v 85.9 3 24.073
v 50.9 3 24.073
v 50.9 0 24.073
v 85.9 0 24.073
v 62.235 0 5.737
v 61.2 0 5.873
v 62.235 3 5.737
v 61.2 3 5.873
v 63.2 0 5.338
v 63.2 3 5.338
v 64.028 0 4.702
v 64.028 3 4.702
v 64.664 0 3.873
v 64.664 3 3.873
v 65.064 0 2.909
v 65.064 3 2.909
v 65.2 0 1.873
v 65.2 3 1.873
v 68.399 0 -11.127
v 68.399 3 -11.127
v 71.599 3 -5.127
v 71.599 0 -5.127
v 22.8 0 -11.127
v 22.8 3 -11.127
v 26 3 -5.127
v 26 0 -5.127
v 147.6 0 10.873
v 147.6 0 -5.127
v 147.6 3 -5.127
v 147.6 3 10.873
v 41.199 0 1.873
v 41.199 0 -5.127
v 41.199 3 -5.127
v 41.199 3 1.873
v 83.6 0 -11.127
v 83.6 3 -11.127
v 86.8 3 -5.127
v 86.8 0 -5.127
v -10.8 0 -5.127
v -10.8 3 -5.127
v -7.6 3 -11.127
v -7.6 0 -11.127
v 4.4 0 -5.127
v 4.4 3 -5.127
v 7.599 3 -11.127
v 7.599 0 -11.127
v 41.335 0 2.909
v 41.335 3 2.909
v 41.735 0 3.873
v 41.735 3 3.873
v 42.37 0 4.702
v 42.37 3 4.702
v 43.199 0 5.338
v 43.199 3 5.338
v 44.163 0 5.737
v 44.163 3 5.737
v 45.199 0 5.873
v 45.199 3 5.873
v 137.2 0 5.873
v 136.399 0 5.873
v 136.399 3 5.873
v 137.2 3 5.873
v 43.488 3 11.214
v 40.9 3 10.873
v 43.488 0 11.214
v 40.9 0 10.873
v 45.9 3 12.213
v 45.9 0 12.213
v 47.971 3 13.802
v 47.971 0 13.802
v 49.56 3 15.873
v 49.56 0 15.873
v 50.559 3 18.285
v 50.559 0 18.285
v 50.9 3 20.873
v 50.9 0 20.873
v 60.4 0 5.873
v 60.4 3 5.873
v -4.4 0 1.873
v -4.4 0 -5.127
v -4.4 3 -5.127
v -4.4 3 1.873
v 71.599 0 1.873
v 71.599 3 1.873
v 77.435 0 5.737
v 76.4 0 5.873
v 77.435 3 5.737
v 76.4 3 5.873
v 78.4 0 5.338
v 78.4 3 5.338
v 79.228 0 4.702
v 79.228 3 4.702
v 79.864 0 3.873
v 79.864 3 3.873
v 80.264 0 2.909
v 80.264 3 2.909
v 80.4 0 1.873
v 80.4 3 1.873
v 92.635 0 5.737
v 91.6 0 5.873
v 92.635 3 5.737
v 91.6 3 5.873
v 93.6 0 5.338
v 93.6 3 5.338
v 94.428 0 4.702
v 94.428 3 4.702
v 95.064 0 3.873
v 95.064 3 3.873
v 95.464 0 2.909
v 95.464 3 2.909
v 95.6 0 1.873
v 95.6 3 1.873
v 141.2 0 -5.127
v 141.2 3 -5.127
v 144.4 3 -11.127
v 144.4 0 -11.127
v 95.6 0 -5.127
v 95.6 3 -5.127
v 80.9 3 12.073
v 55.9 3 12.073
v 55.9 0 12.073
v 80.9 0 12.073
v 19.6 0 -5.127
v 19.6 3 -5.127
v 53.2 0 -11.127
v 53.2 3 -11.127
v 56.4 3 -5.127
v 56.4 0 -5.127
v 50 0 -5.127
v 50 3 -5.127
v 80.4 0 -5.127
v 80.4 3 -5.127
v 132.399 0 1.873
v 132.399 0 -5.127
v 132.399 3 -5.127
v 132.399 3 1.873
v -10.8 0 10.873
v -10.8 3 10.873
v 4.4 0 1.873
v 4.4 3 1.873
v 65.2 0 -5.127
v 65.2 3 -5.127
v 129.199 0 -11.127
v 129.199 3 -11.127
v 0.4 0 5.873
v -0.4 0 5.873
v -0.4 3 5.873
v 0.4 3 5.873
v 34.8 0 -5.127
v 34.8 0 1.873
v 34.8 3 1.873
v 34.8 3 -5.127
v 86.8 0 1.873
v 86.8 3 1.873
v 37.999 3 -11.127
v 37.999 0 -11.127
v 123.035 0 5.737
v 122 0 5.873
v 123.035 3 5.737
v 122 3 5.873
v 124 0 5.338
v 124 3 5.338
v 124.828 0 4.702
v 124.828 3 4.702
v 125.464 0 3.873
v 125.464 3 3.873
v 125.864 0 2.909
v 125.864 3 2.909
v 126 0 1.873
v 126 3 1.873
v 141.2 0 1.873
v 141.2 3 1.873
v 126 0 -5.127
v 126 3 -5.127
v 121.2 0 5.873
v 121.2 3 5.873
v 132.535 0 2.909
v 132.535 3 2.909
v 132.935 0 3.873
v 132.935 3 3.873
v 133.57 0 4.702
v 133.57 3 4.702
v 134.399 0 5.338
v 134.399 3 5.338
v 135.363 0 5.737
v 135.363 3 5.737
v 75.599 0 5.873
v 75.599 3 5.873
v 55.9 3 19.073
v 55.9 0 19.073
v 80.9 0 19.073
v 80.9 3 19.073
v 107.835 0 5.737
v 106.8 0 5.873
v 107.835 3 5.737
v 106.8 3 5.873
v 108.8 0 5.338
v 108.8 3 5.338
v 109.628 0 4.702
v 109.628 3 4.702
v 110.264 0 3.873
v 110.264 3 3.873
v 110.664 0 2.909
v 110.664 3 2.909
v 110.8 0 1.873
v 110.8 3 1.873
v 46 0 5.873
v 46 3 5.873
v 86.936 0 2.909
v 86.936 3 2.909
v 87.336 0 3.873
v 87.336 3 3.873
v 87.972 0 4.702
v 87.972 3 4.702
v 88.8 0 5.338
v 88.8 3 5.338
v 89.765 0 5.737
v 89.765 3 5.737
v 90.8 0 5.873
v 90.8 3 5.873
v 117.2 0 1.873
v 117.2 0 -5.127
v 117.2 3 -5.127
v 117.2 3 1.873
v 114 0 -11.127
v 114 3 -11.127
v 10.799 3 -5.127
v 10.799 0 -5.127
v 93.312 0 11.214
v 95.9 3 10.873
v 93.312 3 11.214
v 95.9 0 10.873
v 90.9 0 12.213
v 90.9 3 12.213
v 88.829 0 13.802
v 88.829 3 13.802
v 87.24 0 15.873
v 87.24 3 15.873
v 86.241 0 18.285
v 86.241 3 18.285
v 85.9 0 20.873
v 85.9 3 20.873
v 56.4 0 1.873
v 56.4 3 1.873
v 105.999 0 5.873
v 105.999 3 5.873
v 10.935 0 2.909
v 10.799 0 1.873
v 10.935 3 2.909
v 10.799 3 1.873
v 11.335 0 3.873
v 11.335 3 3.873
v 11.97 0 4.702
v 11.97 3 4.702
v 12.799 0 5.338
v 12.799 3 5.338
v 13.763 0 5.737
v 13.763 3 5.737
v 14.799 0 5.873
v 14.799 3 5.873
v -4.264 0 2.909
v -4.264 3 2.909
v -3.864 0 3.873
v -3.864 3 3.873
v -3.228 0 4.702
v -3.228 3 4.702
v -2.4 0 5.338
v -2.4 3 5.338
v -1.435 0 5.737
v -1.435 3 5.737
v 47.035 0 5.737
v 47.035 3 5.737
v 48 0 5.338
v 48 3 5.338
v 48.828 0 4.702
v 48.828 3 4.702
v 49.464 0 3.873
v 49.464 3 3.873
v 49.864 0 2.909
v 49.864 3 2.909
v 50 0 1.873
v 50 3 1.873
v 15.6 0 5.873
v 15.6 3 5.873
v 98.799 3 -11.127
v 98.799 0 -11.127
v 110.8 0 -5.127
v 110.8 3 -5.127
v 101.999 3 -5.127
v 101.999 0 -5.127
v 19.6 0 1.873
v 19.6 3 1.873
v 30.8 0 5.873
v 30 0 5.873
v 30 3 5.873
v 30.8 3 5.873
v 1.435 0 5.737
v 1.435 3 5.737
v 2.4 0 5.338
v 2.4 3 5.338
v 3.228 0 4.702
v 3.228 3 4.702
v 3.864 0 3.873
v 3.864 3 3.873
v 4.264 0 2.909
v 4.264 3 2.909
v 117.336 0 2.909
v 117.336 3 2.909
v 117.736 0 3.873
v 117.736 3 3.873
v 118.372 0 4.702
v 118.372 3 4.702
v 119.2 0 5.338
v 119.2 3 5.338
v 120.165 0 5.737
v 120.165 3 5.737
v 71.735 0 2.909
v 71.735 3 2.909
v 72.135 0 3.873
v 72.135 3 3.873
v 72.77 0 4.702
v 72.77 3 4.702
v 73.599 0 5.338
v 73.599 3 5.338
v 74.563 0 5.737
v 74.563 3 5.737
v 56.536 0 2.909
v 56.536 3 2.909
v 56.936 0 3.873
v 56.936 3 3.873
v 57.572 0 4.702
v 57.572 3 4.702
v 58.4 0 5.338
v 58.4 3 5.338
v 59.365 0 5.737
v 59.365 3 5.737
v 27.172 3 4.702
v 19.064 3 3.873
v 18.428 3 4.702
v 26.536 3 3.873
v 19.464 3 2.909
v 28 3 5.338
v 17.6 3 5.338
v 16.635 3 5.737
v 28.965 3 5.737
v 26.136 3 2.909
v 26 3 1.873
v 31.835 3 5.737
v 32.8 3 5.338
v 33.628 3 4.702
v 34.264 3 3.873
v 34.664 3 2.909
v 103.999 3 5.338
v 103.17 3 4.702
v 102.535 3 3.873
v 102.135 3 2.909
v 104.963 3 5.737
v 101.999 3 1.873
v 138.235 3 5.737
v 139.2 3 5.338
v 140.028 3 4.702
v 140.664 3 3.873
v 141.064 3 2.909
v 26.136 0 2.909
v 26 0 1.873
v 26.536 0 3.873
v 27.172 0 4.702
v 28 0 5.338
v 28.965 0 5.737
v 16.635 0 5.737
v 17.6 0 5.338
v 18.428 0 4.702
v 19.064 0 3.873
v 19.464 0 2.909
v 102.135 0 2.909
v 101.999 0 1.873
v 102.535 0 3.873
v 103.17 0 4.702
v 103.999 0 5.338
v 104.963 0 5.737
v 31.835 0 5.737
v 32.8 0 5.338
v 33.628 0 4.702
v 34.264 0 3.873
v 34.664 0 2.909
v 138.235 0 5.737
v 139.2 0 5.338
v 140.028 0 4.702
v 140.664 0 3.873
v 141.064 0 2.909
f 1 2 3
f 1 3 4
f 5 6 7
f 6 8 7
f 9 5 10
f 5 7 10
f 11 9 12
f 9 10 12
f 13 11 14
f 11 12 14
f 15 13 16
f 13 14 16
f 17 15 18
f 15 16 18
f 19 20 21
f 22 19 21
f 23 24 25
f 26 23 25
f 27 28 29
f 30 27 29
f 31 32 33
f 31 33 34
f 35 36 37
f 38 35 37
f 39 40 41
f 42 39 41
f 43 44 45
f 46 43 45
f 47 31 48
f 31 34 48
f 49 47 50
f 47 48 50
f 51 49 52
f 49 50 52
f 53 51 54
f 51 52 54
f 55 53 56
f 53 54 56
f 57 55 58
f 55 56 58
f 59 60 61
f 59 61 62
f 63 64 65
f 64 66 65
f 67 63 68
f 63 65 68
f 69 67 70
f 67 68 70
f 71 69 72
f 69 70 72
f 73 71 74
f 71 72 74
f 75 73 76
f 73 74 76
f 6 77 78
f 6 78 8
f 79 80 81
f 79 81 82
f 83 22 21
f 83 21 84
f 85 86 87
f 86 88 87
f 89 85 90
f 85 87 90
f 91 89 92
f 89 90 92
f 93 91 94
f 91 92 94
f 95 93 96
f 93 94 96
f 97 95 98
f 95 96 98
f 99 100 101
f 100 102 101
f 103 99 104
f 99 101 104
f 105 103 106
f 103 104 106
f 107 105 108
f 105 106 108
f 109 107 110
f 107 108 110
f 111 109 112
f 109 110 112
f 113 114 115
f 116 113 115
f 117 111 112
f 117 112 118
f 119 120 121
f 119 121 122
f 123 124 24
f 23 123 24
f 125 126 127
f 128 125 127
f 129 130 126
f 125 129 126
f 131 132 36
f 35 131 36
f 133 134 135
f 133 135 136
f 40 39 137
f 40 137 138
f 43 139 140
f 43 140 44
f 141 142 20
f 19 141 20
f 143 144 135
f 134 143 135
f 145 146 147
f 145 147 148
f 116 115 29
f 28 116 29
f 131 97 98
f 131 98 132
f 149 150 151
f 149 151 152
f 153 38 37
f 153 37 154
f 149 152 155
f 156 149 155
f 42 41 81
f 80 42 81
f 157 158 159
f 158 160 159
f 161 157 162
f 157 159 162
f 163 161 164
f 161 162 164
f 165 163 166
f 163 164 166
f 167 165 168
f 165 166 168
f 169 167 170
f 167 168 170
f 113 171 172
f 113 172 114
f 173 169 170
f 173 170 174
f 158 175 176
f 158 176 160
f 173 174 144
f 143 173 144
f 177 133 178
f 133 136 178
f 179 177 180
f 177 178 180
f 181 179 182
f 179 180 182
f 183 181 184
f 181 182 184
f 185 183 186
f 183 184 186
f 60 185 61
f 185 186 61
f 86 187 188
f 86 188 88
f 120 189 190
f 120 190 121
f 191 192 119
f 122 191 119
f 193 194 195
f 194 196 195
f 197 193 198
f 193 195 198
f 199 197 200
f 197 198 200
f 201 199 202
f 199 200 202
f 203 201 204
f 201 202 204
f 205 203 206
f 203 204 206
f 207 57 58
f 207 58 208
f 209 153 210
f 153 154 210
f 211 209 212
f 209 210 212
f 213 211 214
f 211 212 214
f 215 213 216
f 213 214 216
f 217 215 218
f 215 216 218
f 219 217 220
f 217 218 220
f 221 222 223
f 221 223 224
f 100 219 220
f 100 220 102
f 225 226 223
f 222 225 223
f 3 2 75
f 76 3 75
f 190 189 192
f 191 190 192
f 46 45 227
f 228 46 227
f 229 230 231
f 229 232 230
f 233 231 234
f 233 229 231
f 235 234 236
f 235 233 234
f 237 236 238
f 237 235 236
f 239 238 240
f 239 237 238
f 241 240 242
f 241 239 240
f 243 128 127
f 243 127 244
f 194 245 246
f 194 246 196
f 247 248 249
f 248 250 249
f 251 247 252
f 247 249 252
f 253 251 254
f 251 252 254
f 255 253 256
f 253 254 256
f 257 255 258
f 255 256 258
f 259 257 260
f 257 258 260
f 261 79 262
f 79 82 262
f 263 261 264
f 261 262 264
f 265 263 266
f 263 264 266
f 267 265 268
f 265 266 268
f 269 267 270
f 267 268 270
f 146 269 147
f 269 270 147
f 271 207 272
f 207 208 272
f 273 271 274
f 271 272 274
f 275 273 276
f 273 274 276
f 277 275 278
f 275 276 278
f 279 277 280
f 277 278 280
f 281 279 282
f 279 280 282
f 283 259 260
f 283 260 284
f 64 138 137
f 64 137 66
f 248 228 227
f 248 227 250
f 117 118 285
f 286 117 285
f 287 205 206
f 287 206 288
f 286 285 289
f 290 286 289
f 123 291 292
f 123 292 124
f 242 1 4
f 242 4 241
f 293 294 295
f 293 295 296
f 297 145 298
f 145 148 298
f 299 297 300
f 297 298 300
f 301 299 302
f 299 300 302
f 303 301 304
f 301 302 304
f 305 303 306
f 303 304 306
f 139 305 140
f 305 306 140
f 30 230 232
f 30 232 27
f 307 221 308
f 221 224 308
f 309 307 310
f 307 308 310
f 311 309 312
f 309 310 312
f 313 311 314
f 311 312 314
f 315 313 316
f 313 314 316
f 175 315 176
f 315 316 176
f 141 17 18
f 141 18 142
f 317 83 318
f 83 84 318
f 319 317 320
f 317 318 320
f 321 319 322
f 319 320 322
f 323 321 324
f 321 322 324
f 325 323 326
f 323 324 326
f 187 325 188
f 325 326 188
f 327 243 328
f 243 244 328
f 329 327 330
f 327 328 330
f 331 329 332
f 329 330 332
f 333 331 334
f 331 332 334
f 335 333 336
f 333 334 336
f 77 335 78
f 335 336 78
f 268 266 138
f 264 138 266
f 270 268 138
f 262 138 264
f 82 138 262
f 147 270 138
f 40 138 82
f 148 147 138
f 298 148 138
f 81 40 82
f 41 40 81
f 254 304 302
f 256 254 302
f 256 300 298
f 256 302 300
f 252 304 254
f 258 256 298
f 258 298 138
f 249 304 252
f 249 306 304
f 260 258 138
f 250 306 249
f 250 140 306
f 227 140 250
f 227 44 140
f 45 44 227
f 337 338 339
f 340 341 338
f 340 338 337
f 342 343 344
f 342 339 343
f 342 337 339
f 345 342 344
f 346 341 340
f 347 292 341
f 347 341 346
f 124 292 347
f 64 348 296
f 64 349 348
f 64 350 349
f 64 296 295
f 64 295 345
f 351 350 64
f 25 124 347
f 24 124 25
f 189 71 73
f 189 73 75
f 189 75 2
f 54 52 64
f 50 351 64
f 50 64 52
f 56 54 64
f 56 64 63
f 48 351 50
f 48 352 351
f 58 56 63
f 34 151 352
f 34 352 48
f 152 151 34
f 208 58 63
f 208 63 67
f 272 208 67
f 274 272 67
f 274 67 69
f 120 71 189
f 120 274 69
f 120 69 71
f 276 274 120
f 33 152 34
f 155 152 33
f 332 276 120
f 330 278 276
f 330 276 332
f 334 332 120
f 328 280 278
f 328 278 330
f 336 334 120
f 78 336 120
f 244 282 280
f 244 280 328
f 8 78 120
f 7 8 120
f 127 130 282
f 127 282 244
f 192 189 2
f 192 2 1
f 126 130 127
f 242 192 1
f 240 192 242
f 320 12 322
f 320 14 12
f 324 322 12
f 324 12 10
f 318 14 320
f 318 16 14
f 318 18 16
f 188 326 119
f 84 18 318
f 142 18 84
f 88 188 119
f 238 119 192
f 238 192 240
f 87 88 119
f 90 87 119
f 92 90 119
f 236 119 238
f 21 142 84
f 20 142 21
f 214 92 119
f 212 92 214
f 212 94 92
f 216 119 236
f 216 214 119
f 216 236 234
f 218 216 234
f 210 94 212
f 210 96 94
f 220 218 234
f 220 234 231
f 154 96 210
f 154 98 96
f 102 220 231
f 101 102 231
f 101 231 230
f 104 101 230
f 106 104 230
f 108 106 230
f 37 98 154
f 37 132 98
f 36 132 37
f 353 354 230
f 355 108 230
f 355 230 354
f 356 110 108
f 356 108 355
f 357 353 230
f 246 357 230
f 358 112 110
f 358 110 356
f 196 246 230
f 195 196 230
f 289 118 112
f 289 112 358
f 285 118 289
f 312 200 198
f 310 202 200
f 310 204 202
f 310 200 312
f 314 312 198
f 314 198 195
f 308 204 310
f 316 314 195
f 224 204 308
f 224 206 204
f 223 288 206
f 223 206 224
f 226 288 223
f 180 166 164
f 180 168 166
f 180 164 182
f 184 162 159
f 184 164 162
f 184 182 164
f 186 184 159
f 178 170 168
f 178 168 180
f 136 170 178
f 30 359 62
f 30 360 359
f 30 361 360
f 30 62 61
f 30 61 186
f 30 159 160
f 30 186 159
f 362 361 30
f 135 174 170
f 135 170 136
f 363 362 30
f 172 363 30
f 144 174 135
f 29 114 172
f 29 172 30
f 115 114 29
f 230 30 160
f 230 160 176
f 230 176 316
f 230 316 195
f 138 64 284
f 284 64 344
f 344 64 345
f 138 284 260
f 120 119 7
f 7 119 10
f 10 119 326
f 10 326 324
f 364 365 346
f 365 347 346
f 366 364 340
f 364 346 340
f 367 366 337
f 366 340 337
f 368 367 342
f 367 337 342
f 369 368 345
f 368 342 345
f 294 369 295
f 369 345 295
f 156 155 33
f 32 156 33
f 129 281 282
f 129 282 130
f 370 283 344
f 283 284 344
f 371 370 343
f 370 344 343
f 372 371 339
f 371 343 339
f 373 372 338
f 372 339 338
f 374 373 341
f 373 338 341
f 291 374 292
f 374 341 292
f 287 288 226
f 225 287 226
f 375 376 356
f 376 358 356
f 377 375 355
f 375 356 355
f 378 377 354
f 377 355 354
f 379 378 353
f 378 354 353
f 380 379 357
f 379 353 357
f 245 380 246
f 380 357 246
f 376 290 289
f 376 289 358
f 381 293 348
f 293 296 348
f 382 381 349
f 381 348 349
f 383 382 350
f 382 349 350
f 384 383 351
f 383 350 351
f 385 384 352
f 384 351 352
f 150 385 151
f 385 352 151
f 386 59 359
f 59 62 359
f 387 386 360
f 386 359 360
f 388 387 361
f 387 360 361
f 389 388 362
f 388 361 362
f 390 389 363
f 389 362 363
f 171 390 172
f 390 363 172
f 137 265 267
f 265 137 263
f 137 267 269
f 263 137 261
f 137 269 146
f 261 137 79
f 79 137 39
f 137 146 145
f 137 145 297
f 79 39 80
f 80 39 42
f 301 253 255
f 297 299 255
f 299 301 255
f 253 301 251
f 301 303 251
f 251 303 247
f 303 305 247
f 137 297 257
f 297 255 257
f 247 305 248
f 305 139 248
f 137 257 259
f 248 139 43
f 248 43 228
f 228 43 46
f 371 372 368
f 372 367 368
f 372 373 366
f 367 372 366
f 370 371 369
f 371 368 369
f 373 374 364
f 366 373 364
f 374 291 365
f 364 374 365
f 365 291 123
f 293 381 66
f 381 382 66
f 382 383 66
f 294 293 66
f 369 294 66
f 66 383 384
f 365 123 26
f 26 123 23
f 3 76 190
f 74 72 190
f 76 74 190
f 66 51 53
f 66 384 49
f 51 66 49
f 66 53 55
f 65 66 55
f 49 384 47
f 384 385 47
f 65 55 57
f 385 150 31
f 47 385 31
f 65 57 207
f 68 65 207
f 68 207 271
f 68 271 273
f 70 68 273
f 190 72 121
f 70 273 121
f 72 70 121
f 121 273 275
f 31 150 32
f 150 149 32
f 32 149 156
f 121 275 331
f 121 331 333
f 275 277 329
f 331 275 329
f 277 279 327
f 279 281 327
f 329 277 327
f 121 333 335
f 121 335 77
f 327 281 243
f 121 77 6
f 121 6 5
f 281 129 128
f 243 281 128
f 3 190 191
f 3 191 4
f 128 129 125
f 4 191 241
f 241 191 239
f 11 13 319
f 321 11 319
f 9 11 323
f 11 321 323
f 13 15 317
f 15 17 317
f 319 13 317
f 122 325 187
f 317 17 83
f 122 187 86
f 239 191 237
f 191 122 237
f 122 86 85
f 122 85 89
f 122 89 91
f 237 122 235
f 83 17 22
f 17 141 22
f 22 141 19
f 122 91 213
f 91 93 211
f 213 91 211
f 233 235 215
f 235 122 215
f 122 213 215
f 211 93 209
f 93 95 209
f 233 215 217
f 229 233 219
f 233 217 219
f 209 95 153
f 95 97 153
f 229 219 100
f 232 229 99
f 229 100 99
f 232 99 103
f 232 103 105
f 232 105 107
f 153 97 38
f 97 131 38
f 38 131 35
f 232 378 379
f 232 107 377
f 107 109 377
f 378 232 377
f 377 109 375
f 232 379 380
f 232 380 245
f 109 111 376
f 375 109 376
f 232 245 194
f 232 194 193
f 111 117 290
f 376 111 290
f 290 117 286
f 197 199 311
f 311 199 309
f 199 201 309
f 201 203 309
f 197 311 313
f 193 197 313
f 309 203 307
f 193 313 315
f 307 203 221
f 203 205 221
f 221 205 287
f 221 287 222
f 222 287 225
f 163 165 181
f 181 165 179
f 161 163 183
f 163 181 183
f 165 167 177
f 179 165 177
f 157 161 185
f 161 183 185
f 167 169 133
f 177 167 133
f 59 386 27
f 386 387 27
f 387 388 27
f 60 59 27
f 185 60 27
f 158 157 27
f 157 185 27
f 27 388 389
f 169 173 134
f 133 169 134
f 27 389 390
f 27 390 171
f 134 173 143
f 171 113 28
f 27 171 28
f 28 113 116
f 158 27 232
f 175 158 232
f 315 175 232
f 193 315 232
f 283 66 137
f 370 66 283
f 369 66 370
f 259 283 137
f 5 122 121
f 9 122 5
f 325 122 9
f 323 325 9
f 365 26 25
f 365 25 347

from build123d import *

# Parameters (mm, degrees)
BOSS_EXTRUDE1_DEPTH = 3
BOSS_EXTRUDE2_DEPTH = 3
FILLET1_R           = 4
LPATTERN1_COUNT     = 5
LPATTERN1_PITCH     = 30.4
SKETCH5_W           = 158.4
SKETCH5_H           = 3
BOSS_EXTRUDE3_DEPTH = 15
SKETCH6_W           = 25
SKETCH6_H           = 7
CUT_EXTRUDE1_DEPTH  = 60
SKETCH7_W           = 61.7
SKETCH7_H           = 13.2
CUT_EXTRUDE2_DEPTH  = 10
FILLET2_R           = 10


with BuildPart() as part:
    # Sketch1 → Boss-Extrude1 (new body)
    with BuildSketch(Plane(origin=(0, 0, 0), x_dir=(1, 0, 0), z_dir=(0, 1, 0))):
        Polygon((26, -9.073446812), (-10.8, -9.073446812), (-10.8, -5.873446812), (-10.8, 5.126553188), (-4.4, 5.126553188), (-4.4, -5.873446812), (4.4, -5.873446812), (4.4, 5.126553188), (10.798731059, 5.126553188), (10.798731059, -5.873446812), (19.6, -5.873446812), (19.6, 5.126553188), (26, 5.126553188), align=None)
    extrude(amount=BOSS_EXTRUDE1_DEPTH)

    # Sketch2 → Boss-Extrude2 (add)
    with BuildSketch(Plane(origin=(0, 3, 0), x_dir=(1, 0, 0), z_dir=(0, 1, 0))):
        Polygon((-10.8, 5.126553188), (-7.6, 11.126553188), (-4.4, 5.126553188), align=None)
        Polygon((4.4, 5.126553188), (7.59936553, 11.126553188), (10.798731059, 5.126553188), align=None)
        Polygon((19.6, 5.126553188), (22.8, 11.126553188), (26, 5.126553188), align=None)
    extrude(amount=-BOSS_EXTRUDE2_DEPTH)

    # Fillet1
    fillet1_edges = [part.edges().sort_by_distance(p)[0] for p in [
        (-4.4, 1.5, 5.873446812),
        (4.4, 1.5, 5.873446812),
        (10.798731059, 1.5, 5.873446812),
        (19.6, 1.5, 5.873446812),
    ]]
    fillet(fillet1_edges, radius=FILLET1_R)


with BuildPart() as lpattern1_1:
    # LPattern1: pattern copy
    add(part.part.moved(Location(Vector(1, 0, 0) * (1 * LPATTERN1_PITCH))))


with BuildPart() as lpattern1_2:
    # LPattern1: pattern copy
    add(part.part.moved(Location(Vector(1, 0, 0) * (2 * LPATTERN1_PITCH))))


with BuildPart() as lpattern1_3:
    # LPattern1: pattern copy
    add(part.part.moved(Location(Vector(1, 0, 0) * (3 * LPATTERN1_PITCH))))


with BuildPart() as lpattern1_4:
    # LPattern1: pattern copy
    add(part.part.moved(Location(Vector(1, 0, 0) * (4 * LPATTERN1_PITCH))))


with BuildPart() as part_1:
    add(part.part)

    # Combine1: union LPattern1_1, LPattern1_2, LPattern1_3, LPattern1_4
    add(lpattern1_1.part)
    add(lpattern1_2.part)
    add(lpattern1_3.part)
    add(lpattern1_4.part)

    # Sketch5 → Boss-Extrude3 (add)
    with BuildSketch(Plane.XY.offset(9.073446812)):
        with Locations((68.4, 1.5)):
            Rectangle(SKETCH5_W, SKETCH5_H)
    extrude(amount=BOSS_EXTRUDE3_DEPTH)

    # Sketch6 → Cut-Extrude1 (cut)
    with BuildSketch(Plane(origin=(0, 3, 0), x_dir=(1, 0, 0), z_dir=(0, 1, 0))):
        with Locations((68.4, -15.573446812)):
            Rectangle(SKETCH6_W, SKETCH6_H)
    extrude(amount=-CUT_EXTRUDE1_DEPTH, mode=Mode.SUBTRACT)

    # Sketch7 → Cut-Extrude2 (cut)
    with BuildSketch(Plane(origin=(0, 3, 0), x_dir=(1, 0, 0), z_dir=(0, 1, 0))):
        with Locations((20.05, -17.473446812)):
            Rectangle(SKETCH7_W, SKETCH7_H)
        with Locations((116.75, -17.473446812)):
            Rectangle(SKETCH7_W, SKETCH7_H)
    extrude(amount=-CUT_EXTRUDE2_DEPTH, mode=Mode.SUBTRACT)

    # Fillet2
    fillet2_edges = [part_1.edges().sort_by_distance(p)[0] for p in [
        (50.9, 1.5, 10.873446812),
        (85.9, 1.5, 10.873446812),
    ]]
    fillet(fillet2_edges, radius=FILLET2_R)


solid = part_1.part
